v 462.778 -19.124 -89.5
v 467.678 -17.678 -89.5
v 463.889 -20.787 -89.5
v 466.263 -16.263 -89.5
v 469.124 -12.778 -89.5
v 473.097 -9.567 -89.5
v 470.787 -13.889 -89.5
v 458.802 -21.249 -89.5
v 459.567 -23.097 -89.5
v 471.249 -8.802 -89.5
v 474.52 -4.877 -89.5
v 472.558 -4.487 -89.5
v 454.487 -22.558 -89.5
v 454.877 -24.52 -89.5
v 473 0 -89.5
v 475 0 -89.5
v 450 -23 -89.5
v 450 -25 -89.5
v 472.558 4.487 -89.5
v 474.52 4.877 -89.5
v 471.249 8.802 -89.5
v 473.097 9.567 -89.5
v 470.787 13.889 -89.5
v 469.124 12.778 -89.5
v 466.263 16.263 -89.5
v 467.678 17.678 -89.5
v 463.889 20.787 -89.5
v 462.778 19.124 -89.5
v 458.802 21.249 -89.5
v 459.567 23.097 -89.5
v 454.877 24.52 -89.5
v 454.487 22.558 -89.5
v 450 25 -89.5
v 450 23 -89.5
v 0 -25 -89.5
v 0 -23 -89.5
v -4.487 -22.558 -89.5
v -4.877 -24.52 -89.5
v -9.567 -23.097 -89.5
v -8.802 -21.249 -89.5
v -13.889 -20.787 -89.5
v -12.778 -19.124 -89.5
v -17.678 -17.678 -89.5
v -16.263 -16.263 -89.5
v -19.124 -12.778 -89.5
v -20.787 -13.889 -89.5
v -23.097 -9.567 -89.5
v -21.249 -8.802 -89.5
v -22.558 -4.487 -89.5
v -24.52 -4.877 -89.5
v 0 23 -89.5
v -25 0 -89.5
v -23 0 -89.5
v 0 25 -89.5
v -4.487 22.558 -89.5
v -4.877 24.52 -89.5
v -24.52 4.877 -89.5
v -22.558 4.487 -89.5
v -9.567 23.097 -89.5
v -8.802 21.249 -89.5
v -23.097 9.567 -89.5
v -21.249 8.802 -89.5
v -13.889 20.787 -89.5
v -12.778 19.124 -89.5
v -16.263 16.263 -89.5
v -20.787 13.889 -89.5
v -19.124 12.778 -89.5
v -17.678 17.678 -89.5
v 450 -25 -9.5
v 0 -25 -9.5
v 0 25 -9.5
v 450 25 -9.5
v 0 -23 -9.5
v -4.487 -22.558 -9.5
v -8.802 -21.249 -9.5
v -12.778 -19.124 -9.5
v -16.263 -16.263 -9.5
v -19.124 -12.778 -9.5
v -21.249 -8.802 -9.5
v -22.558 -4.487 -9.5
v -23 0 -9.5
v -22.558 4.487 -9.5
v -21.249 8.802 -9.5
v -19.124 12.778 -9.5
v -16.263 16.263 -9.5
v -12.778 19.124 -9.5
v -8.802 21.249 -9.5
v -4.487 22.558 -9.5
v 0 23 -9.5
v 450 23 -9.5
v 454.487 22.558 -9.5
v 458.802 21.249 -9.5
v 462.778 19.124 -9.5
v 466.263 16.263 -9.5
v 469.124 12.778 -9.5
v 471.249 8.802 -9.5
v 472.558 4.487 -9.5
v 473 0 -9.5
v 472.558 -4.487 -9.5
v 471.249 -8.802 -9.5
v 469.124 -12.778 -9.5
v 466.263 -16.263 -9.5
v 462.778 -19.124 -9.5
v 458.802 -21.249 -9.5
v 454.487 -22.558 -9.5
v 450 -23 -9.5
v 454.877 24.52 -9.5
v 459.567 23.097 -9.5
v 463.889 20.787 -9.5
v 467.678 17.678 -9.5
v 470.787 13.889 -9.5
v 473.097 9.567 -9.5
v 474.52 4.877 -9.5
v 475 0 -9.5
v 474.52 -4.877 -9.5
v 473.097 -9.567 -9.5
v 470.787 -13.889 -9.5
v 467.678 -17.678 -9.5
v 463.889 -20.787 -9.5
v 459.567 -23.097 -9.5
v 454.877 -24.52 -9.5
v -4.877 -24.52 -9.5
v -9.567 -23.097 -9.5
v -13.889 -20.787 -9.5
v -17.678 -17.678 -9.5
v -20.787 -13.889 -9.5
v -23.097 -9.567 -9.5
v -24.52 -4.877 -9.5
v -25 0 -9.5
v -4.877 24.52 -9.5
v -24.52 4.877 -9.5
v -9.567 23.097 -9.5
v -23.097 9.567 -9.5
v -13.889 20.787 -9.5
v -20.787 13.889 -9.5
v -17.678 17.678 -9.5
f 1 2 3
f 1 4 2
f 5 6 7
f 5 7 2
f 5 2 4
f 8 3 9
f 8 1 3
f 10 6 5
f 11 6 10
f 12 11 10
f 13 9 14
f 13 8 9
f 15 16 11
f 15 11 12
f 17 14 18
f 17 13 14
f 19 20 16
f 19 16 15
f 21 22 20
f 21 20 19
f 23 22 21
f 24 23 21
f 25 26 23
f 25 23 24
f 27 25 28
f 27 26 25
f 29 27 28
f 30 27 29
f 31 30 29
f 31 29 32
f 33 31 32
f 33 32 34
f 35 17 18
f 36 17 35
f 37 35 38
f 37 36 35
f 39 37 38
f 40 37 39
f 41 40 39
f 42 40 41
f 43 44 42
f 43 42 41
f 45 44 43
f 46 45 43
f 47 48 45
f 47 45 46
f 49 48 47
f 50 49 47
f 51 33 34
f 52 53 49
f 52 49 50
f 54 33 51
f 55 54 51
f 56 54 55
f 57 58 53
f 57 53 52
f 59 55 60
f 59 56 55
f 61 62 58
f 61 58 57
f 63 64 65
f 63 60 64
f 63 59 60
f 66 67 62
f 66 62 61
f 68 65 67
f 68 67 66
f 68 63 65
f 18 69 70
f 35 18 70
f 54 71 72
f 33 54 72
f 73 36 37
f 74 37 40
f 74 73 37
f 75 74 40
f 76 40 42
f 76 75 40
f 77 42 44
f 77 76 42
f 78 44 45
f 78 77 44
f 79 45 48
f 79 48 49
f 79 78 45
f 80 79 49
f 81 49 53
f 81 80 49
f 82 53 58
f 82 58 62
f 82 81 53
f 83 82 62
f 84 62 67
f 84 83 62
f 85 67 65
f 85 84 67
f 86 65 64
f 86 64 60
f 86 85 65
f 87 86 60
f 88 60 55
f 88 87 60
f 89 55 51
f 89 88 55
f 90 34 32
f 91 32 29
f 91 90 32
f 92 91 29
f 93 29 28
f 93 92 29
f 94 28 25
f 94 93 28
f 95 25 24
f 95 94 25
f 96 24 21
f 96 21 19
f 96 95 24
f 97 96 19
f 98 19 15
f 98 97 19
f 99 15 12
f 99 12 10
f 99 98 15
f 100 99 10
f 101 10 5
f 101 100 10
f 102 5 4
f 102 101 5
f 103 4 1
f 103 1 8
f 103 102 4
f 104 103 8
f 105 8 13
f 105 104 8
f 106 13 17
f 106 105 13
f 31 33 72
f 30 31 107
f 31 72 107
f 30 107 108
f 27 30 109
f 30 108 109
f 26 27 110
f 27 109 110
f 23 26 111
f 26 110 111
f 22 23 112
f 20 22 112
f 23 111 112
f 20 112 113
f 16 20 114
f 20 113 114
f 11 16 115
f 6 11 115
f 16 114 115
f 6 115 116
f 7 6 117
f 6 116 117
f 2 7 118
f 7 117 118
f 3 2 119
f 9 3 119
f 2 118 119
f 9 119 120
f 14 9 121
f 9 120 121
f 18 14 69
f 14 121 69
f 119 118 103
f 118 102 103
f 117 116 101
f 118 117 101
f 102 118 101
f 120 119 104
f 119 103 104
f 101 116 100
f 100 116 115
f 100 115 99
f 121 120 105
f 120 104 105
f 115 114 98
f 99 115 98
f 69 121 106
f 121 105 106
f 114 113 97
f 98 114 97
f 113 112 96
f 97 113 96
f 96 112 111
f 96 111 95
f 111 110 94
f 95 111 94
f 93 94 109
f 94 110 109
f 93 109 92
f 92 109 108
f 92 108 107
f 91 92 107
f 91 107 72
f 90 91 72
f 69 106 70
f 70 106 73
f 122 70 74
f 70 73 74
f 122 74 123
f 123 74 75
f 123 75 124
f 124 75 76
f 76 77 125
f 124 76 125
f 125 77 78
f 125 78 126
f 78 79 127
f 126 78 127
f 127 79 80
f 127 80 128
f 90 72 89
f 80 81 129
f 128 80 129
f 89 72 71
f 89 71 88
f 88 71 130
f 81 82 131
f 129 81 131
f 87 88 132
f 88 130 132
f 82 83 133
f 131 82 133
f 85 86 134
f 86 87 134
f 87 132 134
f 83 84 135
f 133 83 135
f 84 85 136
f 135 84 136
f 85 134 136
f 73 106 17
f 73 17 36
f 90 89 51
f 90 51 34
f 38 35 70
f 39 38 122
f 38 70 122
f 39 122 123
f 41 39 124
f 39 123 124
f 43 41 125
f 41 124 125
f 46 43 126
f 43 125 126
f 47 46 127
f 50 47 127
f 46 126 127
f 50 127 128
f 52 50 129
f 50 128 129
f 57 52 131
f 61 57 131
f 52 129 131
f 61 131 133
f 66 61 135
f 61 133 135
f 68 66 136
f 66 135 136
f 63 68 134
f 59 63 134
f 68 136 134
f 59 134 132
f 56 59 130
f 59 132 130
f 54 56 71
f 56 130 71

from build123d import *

# Parameters (mm, degrees)
AUFSATZ_LINEAR_START            = -9.5
AUFSATZ_LINEAR_AUSTRAGEN1_DEPTH = 80


with BuildPart() as part:
    # Skizze1 → Aufsatz-Linear austragen1 (new body)
    with BuildSketch(Plane.XY.offset(AUFSATZ_LINEAR_START)):
        with BuildLine():
            Line((0, 25), (435, 25))
            Line((435, 25), (450, 25))
            ThreePointArc((450, 25), (475, 0), (450, -25))
            Line((450, -25), (0, -25))
            ThreePointArc((0, -25), (-25, 0), (0, 25))
        make_face()
        with BuildLine():
            Line((0, 23), (435, 23))
            Line((435, 23), (450, 23))
            ThreePointArc((450, 23), (473, 0), (450, -23))
            Line((450, -23), (0, -23))
            ThreePointArc((0, -23), (-23, 0), (0, 23))
        make_face(mode=Mode.SUBTRACT)
    extrude(amount=-AUFSATZ_LINEAR_AUSTRAGEN1_DEPTH)


solid = part.part
